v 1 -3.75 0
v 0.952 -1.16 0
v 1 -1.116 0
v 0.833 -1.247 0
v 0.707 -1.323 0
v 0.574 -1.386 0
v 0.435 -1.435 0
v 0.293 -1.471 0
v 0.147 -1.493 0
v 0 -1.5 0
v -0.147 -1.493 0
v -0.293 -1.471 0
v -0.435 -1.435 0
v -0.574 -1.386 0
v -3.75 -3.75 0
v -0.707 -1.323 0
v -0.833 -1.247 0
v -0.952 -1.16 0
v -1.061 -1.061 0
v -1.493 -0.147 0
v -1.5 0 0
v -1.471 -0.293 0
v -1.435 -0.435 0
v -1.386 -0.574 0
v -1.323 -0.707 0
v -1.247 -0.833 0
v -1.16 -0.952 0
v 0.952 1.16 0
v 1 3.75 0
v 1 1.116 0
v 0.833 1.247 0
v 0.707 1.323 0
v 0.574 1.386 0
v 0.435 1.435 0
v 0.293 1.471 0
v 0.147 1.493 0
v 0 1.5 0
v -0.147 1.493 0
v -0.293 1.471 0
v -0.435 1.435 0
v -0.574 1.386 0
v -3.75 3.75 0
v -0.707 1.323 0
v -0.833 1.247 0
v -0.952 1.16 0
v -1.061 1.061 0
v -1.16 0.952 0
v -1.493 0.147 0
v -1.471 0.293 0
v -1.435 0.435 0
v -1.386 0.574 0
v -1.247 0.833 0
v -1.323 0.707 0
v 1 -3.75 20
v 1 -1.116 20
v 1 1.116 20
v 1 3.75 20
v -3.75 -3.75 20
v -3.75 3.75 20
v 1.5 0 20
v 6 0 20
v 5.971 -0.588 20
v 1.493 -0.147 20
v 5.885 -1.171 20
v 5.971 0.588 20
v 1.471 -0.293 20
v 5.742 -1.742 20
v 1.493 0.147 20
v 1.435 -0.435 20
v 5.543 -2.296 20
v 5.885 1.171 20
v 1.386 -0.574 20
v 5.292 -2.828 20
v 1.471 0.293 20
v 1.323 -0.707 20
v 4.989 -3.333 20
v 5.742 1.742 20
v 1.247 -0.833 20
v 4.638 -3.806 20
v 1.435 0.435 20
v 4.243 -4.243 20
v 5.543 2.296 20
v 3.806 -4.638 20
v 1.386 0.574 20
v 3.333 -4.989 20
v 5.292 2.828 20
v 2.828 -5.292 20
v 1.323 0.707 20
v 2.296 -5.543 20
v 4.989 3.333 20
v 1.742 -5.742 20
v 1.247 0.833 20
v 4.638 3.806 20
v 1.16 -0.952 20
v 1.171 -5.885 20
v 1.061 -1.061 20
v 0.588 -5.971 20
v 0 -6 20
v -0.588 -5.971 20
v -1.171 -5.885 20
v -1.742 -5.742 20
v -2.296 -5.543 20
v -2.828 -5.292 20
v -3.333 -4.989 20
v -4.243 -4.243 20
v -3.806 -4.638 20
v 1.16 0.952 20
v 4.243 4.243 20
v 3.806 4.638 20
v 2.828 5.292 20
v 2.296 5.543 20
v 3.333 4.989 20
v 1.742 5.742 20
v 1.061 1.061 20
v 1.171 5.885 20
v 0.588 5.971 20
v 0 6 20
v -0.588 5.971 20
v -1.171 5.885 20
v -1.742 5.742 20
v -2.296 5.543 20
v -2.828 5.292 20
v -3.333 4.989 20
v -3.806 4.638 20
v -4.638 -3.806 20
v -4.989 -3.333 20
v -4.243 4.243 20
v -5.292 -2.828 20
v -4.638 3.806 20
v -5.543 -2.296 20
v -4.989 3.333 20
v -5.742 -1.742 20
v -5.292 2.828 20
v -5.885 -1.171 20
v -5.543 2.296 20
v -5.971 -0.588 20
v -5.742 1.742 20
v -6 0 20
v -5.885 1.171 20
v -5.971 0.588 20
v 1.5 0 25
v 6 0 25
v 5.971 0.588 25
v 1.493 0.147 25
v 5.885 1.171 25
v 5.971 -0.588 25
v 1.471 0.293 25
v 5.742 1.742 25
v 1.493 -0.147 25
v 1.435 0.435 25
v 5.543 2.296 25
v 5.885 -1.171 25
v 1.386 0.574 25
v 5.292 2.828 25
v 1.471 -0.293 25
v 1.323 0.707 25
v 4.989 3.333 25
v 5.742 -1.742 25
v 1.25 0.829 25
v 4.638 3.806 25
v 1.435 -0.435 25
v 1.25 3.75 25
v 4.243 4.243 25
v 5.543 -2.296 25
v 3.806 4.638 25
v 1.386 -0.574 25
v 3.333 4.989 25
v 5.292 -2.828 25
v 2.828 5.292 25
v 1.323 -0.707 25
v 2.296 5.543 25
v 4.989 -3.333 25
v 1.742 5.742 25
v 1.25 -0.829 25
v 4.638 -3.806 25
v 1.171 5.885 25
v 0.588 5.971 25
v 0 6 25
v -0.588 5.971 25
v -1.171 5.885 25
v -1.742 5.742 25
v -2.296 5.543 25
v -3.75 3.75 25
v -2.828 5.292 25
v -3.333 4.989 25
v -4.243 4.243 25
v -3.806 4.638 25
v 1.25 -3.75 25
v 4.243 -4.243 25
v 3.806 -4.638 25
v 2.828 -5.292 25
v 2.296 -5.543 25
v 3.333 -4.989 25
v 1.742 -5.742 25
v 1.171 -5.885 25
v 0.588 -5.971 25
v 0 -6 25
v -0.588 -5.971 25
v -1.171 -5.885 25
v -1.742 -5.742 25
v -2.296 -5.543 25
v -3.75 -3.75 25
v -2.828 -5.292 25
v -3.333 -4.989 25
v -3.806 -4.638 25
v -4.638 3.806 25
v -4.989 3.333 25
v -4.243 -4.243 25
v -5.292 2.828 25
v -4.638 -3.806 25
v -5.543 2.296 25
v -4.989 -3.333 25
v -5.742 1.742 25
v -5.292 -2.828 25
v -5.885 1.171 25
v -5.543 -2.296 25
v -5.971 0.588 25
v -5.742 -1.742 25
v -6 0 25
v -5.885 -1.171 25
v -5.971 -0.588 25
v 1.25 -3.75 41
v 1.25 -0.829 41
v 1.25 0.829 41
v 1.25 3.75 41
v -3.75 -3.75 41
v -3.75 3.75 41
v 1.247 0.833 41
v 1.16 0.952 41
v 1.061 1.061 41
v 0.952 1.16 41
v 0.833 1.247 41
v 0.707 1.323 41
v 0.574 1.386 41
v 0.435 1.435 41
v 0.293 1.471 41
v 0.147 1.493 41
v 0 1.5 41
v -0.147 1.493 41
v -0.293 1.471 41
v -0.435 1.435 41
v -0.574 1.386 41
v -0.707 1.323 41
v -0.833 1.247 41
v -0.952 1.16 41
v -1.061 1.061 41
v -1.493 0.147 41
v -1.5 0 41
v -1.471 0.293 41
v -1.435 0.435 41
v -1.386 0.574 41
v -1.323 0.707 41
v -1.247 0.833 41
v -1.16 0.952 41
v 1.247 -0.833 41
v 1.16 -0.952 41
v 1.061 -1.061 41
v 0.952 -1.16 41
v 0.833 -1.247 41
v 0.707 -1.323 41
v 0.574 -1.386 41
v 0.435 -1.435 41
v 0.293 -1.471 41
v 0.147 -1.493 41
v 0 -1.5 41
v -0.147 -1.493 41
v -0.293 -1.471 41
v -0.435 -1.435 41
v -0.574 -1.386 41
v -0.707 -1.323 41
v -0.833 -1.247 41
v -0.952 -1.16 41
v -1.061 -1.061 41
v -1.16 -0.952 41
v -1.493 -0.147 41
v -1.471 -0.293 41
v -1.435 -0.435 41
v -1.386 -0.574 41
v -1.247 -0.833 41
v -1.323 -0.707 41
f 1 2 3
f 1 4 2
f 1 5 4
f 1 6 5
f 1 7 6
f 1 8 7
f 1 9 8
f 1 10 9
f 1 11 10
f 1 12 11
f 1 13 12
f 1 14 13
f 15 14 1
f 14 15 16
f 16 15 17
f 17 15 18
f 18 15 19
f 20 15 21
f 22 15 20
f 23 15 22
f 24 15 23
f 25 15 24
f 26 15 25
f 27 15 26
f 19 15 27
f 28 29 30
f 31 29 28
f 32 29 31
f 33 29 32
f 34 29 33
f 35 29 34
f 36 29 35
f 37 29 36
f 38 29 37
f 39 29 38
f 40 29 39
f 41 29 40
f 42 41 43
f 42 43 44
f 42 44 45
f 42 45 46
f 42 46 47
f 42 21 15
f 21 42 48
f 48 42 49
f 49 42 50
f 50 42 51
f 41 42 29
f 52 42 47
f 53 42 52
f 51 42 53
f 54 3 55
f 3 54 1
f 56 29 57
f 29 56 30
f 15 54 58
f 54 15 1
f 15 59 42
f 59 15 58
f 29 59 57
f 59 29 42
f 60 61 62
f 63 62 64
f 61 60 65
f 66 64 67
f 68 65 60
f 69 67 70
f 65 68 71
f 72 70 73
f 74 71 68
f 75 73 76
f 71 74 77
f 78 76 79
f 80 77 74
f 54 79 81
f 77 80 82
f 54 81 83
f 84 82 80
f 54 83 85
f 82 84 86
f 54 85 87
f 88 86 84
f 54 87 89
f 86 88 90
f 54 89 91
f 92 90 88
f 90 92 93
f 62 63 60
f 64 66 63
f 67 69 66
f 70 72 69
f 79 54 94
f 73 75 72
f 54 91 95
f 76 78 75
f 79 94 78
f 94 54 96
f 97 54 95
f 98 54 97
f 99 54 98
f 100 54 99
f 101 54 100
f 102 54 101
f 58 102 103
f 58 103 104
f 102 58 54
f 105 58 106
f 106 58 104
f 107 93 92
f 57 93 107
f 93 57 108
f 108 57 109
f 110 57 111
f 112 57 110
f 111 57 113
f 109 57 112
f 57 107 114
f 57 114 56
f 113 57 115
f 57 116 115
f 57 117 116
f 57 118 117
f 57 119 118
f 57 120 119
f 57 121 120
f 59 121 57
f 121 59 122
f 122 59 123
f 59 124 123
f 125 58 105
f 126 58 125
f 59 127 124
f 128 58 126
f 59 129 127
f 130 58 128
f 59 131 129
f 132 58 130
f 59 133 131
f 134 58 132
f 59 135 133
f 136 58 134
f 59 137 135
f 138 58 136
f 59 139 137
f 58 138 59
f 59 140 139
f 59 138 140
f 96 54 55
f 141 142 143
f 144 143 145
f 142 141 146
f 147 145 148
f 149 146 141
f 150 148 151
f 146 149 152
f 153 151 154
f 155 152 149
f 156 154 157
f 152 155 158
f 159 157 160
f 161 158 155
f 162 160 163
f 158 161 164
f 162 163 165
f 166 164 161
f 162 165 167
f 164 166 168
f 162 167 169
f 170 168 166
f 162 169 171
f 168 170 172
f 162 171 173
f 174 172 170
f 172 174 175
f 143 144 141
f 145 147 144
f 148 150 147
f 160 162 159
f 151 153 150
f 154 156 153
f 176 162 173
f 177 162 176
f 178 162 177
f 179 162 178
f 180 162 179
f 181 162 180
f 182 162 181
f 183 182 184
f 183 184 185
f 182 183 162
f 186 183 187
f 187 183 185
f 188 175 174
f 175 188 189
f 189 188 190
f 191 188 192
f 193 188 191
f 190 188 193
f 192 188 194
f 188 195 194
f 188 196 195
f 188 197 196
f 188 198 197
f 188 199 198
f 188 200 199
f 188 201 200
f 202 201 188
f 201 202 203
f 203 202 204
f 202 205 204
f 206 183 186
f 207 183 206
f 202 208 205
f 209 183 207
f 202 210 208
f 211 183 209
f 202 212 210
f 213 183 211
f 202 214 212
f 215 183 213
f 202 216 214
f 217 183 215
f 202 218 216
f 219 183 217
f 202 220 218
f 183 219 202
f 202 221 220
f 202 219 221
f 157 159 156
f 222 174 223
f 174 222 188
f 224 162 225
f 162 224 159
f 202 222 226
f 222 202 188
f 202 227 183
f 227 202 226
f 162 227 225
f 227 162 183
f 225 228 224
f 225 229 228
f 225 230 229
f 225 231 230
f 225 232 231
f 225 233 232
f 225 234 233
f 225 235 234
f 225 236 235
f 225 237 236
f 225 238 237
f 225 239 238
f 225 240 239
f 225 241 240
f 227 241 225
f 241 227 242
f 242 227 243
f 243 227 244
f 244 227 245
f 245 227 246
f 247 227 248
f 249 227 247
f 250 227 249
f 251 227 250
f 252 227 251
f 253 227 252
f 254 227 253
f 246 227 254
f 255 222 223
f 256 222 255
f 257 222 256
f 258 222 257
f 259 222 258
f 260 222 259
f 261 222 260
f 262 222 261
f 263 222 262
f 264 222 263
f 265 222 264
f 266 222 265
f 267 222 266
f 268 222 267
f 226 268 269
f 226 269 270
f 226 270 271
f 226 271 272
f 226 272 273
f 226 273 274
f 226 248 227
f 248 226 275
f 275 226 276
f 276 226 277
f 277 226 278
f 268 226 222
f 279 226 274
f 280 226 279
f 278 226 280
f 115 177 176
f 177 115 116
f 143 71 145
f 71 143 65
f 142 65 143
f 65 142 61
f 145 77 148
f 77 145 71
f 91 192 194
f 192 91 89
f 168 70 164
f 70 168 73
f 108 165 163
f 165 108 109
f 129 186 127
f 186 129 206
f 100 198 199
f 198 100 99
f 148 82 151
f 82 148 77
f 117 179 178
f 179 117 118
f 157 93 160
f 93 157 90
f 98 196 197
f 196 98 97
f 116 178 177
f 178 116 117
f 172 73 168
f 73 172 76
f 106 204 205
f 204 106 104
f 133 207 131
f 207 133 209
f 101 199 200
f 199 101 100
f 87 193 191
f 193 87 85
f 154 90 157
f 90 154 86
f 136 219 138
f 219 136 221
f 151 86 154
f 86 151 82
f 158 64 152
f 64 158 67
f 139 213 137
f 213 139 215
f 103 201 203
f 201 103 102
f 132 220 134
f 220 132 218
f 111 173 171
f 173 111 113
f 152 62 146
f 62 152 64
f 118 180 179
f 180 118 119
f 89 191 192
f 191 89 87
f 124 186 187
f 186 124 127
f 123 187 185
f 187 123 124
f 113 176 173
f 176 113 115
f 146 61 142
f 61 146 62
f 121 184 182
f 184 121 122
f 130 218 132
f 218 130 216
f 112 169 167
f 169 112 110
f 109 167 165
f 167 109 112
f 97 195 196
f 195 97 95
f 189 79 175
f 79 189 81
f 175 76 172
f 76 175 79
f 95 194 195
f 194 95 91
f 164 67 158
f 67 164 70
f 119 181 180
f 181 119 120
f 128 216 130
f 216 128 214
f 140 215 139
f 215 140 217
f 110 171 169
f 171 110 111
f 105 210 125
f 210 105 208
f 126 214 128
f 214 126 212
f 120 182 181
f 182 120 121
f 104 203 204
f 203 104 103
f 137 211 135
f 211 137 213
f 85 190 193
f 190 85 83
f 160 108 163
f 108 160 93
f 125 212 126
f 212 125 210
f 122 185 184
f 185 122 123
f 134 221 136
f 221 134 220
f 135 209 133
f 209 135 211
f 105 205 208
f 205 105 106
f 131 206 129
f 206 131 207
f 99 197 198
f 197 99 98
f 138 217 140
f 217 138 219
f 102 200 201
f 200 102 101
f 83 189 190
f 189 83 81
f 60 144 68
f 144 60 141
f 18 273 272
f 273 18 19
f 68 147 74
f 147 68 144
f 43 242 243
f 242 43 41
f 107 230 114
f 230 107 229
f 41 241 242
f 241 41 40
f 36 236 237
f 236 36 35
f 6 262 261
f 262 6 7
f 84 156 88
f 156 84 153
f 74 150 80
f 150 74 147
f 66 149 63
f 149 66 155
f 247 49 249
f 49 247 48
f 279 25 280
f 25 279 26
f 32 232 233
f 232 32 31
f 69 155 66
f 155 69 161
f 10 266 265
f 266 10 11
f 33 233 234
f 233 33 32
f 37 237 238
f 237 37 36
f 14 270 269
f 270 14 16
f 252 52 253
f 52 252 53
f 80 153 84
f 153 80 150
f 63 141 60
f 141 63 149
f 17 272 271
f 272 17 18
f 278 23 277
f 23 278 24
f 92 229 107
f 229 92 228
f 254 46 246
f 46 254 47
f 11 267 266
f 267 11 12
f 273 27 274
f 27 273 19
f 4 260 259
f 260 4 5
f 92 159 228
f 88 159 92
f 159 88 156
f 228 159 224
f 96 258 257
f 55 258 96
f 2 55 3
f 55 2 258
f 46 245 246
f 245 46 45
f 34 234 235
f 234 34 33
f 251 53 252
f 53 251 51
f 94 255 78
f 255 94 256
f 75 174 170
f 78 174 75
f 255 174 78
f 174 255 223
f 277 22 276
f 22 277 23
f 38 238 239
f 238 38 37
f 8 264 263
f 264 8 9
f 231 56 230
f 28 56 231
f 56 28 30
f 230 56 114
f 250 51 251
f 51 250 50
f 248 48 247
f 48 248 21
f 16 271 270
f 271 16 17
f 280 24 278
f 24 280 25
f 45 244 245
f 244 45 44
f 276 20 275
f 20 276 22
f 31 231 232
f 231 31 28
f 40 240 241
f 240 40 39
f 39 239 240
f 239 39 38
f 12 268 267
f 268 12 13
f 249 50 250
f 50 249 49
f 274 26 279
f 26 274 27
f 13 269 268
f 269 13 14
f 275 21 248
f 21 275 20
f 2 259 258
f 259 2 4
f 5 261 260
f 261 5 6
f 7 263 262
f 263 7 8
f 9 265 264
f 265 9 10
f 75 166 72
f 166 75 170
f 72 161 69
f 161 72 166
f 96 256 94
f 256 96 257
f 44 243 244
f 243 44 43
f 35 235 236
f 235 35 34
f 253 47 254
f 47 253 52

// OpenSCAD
// Hose-barb reducer: 8 mm ID -> 5 mm ID
// Print orientation: standing upright along +Z

$fn = 64;

// ---- Dimensions (mm) ----
id_8     = 8.0;    // inner diameter of 8 mm tubing
id_5     = 5.0;    // inner diameter of 5 mm tubing
bore     = 3.0;    // through-bore diameter
base_d   = 7.5;    // barb outer diameter at bottom (8 mm side)
top_d    = 9.5;    // barb outer diameter at top (8 mm side)
h_8      = 10;     // height of each 8 mm barb
collar_d = 12;     // collar outer diameter (z = 20 to 25)
h_5      = 8;      // height of each 5 mm barb
eps      = 0.5;    // cutter overshoot past faces

total_h = 2*h_8 + 5 + 2*h_5;   // 41 mm overall length

// ---- Model ----
difference() {
    union() {
        // 8 mm tubing barbs (z = 0 to 20)
        for (i = [0 : 1])
            translate([0, 0, i*h_8])
                linear_extrude(height = h_8)
                    polygon([
                        [-(base_d/2), -(base_d/2)],
                        [-(base_d/2),  base_d/2],
                        [(top_d - base_d)/2, base_d/2],
                        [(top_d - base_d)/2, -(base_d/2)]
                    ]);

        // Collar (z = 20 to 25)
        translate([0, 0, 2*h_8])
            cylinder(d = collar_d, h = 5);

        // 5 mm tubing barbs (z = 25 to 41)
        for (i = [0 : 1])
            translate([0, 0, 5 + 2*h_8 + i*h_5])
                linear_extrude(height = h_5)
                    polygon([
                        [-(base_d/2), -(base_d/2)],
                        [-(base_d/2),  base_d/2],
                        [(base_d - id_5)/2, base_d/2],
                        [(base_d - id_5)/2, -(base_d/2)]
                    ]);
    }

    // Through-bore along Z
    translate([0, 0, -eps])
        cylinder(d = bore, h = total_h + 2*eps);
}
